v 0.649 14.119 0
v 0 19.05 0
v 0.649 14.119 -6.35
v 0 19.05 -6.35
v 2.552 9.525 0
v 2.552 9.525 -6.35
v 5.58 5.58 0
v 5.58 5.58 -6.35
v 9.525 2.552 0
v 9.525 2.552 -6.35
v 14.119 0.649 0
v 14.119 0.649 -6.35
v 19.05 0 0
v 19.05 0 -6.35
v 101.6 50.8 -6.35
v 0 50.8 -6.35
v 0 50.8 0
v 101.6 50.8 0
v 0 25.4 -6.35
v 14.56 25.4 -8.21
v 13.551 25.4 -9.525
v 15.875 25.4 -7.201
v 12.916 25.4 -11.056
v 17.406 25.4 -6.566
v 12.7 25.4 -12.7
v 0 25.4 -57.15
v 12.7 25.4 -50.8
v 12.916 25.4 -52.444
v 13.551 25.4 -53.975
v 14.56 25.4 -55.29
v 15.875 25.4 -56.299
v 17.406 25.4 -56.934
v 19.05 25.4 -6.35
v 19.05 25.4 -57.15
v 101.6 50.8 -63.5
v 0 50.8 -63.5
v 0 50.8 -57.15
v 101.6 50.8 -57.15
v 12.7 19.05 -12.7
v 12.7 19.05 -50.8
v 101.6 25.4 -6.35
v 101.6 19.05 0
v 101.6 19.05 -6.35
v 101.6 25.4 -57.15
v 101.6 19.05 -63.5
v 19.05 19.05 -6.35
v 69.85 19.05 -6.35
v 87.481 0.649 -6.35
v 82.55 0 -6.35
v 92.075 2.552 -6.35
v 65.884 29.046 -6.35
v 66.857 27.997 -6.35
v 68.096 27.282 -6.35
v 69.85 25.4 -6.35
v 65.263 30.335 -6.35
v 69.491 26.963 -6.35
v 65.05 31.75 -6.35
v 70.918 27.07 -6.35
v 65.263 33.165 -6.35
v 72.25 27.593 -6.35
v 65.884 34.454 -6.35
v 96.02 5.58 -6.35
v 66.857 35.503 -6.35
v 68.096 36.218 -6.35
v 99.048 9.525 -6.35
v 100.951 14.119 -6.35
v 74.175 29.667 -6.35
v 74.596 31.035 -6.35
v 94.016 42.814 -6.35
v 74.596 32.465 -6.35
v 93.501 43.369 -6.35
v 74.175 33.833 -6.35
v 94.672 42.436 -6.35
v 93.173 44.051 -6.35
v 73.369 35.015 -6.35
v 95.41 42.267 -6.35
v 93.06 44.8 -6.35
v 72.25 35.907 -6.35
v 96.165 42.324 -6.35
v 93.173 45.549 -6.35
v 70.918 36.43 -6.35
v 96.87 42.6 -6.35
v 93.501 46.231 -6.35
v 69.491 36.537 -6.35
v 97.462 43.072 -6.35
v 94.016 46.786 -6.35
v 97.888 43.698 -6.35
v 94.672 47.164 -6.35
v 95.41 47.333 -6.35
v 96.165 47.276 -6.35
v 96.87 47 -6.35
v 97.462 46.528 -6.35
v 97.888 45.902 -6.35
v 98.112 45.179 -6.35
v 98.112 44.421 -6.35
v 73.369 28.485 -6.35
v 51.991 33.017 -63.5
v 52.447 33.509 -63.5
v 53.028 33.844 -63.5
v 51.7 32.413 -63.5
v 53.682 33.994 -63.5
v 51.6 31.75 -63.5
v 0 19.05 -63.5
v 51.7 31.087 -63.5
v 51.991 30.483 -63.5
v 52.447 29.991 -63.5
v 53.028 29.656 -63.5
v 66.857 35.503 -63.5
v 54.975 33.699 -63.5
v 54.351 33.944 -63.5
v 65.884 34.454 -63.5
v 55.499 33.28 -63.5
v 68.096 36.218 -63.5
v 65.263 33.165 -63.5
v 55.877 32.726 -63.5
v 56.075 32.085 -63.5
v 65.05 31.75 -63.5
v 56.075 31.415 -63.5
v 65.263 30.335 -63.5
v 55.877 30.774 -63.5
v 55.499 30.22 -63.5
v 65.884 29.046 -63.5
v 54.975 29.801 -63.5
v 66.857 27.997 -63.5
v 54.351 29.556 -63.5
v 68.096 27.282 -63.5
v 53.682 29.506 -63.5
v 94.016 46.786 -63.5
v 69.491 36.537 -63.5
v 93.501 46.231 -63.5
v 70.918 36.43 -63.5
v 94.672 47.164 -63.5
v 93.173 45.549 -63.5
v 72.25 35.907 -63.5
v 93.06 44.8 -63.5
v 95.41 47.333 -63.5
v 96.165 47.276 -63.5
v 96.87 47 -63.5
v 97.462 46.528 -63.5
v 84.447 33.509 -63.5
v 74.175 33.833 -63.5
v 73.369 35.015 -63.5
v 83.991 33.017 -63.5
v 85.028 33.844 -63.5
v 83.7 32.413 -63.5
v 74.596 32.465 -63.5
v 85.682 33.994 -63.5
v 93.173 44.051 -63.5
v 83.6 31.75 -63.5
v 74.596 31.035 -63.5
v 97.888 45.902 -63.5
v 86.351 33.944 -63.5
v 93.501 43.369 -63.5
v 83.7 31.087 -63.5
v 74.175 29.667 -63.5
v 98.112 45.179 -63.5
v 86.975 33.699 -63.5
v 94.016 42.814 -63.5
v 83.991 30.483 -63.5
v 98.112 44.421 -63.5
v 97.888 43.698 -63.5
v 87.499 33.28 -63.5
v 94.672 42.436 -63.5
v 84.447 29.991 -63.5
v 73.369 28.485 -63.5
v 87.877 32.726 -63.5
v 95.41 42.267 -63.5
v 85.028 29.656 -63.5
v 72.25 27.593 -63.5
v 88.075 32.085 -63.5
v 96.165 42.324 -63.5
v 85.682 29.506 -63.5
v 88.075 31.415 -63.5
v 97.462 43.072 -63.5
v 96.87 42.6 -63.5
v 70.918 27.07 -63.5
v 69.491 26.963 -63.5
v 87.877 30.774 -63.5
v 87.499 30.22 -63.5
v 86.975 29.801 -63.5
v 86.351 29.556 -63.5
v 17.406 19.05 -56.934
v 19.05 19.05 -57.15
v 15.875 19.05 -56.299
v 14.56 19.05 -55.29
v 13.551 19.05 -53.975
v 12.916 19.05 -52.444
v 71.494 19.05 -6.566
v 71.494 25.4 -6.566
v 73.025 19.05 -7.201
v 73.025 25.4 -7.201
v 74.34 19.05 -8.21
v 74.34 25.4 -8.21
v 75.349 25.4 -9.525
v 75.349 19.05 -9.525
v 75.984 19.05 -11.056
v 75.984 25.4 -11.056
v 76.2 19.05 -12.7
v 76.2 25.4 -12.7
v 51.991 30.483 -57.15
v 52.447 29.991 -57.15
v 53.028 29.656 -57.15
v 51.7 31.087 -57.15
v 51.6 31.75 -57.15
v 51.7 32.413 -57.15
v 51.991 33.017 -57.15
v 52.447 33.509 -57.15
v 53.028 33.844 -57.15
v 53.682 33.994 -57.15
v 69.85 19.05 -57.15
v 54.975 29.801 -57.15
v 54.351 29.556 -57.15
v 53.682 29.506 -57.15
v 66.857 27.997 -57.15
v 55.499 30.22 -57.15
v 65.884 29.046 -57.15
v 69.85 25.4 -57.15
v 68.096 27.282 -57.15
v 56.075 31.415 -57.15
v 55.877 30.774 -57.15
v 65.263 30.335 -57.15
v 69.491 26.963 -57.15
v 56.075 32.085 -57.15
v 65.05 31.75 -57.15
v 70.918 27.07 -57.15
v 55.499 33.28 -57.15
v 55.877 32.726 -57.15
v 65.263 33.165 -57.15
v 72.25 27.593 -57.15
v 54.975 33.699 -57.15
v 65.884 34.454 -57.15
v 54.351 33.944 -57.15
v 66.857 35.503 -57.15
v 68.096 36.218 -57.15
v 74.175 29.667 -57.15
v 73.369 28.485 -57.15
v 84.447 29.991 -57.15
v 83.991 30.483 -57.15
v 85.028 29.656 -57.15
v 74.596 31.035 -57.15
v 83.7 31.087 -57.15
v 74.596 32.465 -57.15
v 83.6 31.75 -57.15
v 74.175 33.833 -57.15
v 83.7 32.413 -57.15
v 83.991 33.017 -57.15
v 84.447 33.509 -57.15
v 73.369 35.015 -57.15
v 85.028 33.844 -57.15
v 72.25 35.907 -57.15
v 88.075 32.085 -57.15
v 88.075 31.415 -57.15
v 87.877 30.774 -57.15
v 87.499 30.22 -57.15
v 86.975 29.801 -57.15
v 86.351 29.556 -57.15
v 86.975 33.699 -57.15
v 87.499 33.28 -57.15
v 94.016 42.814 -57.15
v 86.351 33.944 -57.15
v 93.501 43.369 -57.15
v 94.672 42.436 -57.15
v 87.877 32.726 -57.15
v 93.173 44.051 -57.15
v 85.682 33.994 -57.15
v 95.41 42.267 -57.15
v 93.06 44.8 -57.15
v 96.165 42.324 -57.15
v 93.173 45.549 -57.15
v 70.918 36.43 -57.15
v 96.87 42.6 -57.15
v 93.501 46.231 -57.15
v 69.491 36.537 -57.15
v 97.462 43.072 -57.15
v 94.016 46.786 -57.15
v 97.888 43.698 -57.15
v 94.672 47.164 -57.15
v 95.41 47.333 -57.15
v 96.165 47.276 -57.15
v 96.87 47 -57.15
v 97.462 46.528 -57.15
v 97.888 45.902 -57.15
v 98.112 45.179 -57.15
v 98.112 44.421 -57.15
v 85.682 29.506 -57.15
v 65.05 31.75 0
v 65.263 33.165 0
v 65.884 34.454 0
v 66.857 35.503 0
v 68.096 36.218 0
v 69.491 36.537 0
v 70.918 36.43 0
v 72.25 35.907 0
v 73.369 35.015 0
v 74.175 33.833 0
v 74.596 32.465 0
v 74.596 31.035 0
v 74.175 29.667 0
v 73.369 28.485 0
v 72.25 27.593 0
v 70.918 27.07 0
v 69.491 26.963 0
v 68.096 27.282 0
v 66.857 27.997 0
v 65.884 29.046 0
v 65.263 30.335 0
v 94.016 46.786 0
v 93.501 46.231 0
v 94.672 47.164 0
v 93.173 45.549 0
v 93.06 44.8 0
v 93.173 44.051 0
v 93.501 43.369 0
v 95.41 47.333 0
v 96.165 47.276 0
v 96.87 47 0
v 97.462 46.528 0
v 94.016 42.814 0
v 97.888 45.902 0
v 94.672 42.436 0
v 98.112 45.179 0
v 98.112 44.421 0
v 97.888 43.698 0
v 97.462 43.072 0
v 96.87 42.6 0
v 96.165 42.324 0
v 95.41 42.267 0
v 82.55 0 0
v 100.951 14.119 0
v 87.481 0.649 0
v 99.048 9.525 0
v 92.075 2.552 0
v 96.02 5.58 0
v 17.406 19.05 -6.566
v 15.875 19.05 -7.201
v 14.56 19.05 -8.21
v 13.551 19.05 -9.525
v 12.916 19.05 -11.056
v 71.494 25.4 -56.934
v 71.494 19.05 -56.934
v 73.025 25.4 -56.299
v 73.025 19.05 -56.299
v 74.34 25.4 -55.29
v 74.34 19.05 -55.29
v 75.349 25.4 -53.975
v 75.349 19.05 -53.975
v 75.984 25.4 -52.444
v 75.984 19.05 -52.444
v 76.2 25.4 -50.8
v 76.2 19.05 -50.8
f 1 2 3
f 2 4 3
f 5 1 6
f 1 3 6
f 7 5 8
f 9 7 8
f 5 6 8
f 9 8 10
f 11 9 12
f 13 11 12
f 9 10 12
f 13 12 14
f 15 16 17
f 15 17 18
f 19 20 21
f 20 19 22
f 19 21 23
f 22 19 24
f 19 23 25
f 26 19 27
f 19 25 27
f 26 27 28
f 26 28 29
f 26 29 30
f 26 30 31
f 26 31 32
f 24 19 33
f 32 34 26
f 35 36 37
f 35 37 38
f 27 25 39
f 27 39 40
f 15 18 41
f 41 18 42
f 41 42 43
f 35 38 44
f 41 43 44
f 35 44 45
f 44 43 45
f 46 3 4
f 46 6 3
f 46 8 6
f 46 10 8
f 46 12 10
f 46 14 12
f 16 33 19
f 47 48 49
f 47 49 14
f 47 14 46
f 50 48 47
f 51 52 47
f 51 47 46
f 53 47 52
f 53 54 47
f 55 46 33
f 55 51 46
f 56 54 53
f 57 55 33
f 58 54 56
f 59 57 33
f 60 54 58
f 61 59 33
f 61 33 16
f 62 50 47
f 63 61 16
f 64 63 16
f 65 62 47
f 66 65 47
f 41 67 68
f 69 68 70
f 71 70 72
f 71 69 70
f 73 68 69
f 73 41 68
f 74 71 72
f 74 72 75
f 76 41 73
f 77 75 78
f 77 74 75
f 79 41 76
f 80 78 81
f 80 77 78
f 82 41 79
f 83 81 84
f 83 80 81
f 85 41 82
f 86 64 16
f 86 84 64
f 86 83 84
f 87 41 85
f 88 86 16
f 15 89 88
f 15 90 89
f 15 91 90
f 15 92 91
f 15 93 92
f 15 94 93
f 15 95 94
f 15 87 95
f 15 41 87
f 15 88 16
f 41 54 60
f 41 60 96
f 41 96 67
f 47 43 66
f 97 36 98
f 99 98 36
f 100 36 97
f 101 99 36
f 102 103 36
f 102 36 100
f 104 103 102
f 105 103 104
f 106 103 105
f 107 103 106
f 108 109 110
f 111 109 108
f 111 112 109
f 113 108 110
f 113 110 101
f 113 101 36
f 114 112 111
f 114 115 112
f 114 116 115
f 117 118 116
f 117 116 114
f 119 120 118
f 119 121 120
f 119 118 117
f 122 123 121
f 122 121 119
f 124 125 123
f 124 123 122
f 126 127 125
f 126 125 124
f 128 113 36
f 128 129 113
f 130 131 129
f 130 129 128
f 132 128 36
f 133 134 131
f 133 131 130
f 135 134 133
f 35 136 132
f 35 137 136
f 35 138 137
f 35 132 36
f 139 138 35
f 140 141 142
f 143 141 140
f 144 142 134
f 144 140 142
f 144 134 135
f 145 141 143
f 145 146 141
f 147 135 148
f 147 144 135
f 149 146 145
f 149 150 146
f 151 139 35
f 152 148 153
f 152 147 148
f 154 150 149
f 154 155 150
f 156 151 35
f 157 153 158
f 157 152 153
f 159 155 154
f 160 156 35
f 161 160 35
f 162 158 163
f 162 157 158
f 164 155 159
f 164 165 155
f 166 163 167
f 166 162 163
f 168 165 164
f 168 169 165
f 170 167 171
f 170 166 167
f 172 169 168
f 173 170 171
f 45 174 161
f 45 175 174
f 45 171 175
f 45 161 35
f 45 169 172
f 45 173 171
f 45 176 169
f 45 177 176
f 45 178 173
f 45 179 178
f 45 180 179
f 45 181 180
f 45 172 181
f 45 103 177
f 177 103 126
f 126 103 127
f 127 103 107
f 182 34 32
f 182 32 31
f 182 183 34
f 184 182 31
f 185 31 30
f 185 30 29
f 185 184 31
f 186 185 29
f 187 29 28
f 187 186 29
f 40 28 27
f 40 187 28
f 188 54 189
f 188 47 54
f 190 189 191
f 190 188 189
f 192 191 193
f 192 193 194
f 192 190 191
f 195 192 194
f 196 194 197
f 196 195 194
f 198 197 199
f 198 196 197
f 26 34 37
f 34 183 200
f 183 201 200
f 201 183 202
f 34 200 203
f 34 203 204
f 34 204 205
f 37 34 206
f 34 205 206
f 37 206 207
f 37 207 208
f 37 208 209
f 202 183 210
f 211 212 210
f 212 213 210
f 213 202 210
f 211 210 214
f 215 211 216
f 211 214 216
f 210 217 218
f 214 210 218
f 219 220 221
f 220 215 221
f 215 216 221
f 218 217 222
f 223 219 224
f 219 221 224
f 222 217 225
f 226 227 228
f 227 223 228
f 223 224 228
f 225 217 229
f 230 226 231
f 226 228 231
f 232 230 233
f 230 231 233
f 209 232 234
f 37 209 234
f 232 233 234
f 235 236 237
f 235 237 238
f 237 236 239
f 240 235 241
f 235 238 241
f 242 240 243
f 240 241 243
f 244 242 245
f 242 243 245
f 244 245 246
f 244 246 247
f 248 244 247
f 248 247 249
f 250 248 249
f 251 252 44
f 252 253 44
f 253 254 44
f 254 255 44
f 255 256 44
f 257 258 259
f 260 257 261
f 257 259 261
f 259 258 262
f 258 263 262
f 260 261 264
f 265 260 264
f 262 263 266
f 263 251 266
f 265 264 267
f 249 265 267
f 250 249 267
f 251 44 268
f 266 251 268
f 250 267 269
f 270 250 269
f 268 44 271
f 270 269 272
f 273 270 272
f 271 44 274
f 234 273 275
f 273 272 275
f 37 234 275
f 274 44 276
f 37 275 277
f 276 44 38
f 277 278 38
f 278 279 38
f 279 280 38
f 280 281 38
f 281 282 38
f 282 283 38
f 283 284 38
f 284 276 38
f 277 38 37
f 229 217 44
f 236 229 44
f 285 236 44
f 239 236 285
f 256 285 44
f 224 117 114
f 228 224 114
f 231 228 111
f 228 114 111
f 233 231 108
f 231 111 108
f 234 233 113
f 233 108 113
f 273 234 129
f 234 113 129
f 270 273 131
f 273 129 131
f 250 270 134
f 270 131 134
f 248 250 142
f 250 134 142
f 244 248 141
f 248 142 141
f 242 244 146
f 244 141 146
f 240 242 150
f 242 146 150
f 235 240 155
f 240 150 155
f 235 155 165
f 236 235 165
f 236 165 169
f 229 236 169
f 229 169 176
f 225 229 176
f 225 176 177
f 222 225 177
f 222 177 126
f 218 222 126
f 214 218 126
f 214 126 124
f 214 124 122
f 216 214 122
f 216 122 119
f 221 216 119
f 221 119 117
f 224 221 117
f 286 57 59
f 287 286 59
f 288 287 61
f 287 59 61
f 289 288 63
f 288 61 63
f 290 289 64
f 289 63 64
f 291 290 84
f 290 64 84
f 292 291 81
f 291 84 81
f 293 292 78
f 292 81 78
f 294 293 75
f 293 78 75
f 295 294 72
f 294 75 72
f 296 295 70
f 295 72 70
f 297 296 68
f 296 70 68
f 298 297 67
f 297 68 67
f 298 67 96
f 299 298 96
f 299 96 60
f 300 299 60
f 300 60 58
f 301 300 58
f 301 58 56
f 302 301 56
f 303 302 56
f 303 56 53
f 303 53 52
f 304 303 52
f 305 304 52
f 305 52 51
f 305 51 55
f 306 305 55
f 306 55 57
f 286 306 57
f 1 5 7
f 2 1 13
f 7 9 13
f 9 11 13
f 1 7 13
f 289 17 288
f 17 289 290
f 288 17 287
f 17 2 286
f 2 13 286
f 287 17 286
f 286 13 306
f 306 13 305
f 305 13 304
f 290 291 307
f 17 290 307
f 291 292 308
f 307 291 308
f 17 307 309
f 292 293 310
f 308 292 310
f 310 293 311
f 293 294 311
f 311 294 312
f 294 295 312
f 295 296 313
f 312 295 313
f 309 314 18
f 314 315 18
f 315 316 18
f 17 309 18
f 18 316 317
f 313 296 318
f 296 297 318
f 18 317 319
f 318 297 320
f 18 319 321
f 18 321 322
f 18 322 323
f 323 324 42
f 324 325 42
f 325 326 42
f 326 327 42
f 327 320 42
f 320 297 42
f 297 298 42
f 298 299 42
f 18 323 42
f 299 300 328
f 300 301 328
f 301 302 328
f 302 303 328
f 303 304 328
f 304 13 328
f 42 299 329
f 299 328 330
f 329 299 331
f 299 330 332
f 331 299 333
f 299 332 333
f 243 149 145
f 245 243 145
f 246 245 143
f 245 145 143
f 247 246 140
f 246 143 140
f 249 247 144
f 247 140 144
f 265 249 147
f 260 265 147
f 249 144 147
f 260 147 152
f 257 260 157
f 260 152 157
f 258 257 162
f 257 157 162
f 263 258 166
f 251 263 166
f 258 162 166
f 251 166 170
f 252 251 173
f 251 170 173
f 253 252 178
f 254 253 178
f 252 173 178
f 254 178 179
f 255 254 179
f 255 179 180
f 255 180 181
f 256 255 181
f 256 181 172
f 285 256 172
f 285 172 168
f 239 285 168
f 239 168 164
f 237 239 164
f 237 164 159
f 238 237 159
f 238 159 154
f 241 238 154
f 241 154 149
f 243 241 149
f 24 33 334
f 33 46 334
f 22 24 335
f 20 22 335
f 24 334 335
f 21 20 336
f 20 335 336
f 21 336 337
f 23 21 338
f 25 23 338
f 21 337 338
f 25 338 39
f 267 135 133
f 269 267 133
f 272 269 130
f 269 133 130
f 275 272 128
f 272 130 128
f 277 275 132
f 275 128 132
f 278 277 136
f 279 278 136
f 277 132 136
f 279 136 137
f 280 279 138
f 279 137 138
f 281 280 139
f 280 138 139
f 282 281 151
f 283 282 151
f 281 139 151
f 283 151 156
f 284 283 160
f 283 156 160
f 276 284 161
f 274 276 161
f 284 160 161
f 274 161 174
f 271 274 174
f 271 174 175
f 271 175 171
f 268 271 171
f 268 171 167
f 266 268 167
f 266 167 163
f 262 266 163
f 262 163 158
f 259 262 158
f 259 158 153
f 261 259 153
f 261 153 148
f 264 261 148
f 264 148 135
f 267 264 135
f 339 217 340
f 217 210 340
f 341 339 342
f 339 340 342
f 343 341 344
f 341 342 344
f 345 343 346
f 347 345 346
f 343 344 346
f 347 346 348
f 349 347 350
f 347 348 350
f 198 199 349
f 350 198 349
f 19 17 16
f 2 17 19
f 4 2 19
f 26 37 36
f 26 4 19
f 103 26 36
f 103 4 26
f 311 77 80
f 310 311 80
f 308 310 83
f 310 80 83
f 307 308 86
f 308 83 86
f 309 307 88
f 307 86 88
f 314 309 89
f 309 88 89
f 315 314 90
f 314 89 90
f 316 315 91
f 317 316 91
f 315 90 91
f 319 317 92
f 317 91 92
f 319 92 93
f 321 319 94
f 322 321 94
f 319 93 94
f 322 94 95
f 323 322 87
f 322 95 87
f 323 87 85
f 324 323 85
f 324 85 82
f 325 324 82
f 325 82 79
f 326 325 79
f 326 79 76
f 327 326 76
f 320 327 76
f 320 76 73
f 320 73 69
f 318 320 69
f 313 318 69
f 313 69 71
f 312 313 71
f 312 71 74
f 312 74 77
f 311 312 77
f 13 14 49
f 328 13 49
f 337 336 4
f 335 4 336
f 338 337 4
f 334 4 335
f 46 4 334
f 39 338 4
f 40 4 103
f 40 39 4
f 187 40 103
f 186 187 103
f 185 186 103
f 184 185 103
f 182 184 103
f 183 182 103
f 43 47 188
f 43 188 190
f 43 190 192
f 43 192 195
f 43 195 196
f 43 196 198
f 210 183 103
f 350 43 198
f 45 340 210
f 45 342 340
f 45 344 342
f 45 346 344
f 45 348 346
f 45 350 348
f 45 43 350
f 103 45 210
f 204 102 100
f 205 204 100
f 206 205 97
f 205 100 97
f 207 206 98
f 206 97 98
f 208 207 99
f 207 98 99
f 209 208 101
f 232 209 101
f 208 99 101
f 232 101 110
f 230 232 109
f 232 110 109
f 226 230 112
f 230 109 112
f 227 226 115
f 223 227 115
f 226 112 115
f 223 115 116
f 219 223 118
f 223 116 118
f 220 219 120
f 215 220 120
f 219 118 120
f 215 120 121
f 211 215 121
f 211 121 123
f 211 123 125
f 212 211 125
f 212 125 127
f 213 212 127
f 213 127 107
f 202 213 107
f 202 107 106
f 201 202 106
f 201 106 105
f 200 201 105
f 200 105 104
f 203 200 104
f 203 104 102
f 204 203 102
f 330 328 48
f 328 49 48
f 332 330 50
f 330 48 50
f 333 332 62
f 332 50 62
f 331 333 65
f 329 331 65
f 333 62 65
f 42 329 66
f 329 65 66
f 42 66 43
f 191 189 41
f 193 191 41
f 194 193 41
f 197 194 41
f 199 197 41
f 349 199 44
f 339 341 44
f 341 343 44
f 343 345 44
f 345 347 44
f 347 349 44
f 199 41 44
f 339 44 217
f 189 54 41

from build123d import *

# Parameters (mm, degrees)
SKETCH1_W           = 101.6
SKETCH1_H           = 63.5
BOSS_EXTRUDE1_DEPTH = 50.8
CUT_EXTRUDE1_REACH  = 132.136
SKETCH2_W           = 50.8
SKETCH2_H           = 25.4
SKETCH2_W_2         = 57.15
SKETCH2_H_2         = 19.05
SKETCH5_W           = 63.5
SKETCH5_H           = 50.8
CUT_EXTRUDE5_DEPTH  = 6.35
CUT_EXTRUDE2_REACH  = 132.136
SKETCH3_R           = 2.25
CUT_EXTRUDE3_REACH  = 132.136
CUT_EXTRUDE4_REACH  = 132.136
SKETCH4_R           = 2.54
FILLET1_R           = 19.05
FILLET2_R           = 6.35


with BuildPart() as part:
    # Sketch1 → Boss-Extrude1 (new body)
    with BuildSketch(Plane(origin=(0, 0, 0), x_dir=(1, 0, 0), z_dir=(0, 1, 0))):
        with Locations((50.8, 31.75)):
            Rectangle(SKETCH1_W, SKETCH1_H)
    extrude(amount=BOSS_EXTRUDE1_DEPTH)

    # Sketch2 → Cut-Extrude1 (cut, up to next)
    with BuildSketch(Plane(origin=(101.6, 0, 0), x_dir=(0, 0, -1), z_dir=(1, 0, 0)), mode=Mode.PRIVATE) as cut_extrude1_sk1:
        with Locations((31.75, 38.1)):
            Rectangle(SKETCH2_W, SKETCH2_H)
    cut_extrude1_tool1 = extrude(cut_extrude1_sk1.sketch, amount=-CUT_EXTRUDE1_REACH, mode=Mode.PRIVATE) & part.part
    # Sketch2 → Cut-Extrude1 (cut, up to next)
    with BuildSketch(Plane(origin=(101.6, 0, 0), x_dir=(0, 0, -1), z_dir=(1, 0, 0)), mode=Mode.PRIVATE) as cut_extrude1_sk2:
        with Locations((34.925, 9.525)):
            Rectangle(SKETCH2_W_2, SKETCH2_H_2)
    cut_extrude1_tool2 = extrude(cut_extrude1_sk2.sketch, amount=-CUT_EXTRUDE1_REACH, mode=Mode.PRIVATE) & part.part
    add(cut_extrude1_tool1.solids().sort_by_distance((101.6, 38.1, -31.75))[0], mode=Mode.SUBTRACT)
    add(cut_extrude1_tool2.solids().sort_by_distance((101.6, 9.525, -34.925))[0], mode=Mode.SUBTRACT)

    # Sketch5 → Cut-Extrude5 (cut)
    with BuildSketch(Plane(origin=(0, 25.4, 0), x_dir=(1, 0, 0), z_dir=(0, 1, 0))):
        with Locations((44.45, 31.75)):
            Rectangle(SKETCH5_W, SKETCH5_H)
    extrude(amount=-CUT_EXTRUDE5_DEPTH, mode=Mode.SUBTRACT)

    # Sketch3 → Cut-Extrude2 (cut, up to next)
    with BuildSketch(Plane(origin=(0, 0, -63.5), x_dir=(-1, 0, 0), z_dir=(0, 0, -1)), mode=Mode.PRIVATE) as cut_extrude2_sk1:
        with Locations((-85.85, 31.75)):
            Circle(SKETCH3_R)
    cut_extrude2_tool1 = extrude(cut_extrude2_sk1.sketch, amount=-CUT_EXTRUDE2_REACH, mode=Mode.PRIVATE) & part.part
    # Sketch3 → Cut-Extrude2 (cut, up to next)
    with BuildSketch(Plane(origin=(0, 0, -63.5), x_dir=(-1, 0, 0), z_dir=(0, 0, -1)), mode=Mode.PRIVATE) as cut_extrude2_sk2:
        with Locations((-53.85, 31.75)):
            Circle(SKETCH3_R)
    cut_extrude2_tool2 = extrude(cut_extrude2_sk2.sketch, amount=-CUT_EXTRUDE2_REACH, mode=Mode.PRIVATE) & part.part
    add(cut_extrude2_tool1.solids().sort_by_distance((85.85, 31.75, -63.5))[0], mode=Mode.SUBTRACT)
    add(cut_extrude2_tool2.solids().sort_by_distance((53.85, 31.75, -63.5))[0], mode=Mode.SUBTRACT)

    # Cut-Extrude3: up to this face of the body (flat: up to its plane)
    cut_extrude3_end = Plane(part.part.faces().sort_by_distance((50.8, 25.4, 0))[0])
    # Sketch3<4> → Cut-Extrude3 (cut, up to the picked face)
    with BuildSketch(Plane(origin=(0, 0, -63.5), x_dir=(-1, 0, 0), z_dir=(0, 0, -1)), mode=Mode.PRIVATE) as cut_extrude3_sk1:
        with BuildLine():
            ThreePointArc((-65.05, 31.75), (-69.85, 36.55), (-74.65, 31.75))
            Line((-74.65, 31.75), (-65.05, 31.75))
        make_face()
    cut_extrude3_tool1 = split(extrude(cut_extrude3_sk1.sketch, amount=-CUT_EXTRUDE3_REACH, mode=Mode.PRIVATE), bisect_by=cut_extrude3_end, keep=Keep.BOTH, mode=Mode.PRIVATE)
    # Sketch3<4> → Cut-Extrude3 (cut, up to the picked face)
    with BuildSketch(Plane(origin=(0, 0, -63.5), x_dir=(-1, 0, 0), z_dir=(0, 0, -1)), mode=Mode.PRIVATE) as cut_extrude3_sk2:
        with BuildLine():
            Line((-65.05, 31.75), (-74.65, 31.75))
            ThreePointArc((-74.65, 31.75), (-69.85, 26.95), (-65.05, 31.75))
        make_face()
    cut_extrude3_tool2 = split(extrude(cut_extrude3_sk2.sketch, amount=-CUT_EXTRUDE3_REACH, mode=Mode.PRIVATE), bisect_by=cut_extrude3_end, keep=Keep.BOTH, mode=Mode.PRIVATE)
    # Sketch3<4> → Cut-Extrude3 (cut, up to the picked face)
    with BuildSketch(Plane(origin=(0, 0, -63.5), x_dir=(-1, 0, 0), z_dir=(0, 0, -1)), mode=Mode.PRIVATE) as cut_extrude3_sk3:
        with BuildLine():
            ThreePointArc((-65.05, 31.75), (-69.85, 36.55), (-74.65, 31.75))
            Line((-74.65, 31.75), (-65.05, 31.75))
        make_face()
    cut_extrude3_tool3 = split(extrude(cut_extrude3_sk3.sketch, amount=-CUT_EXTRUDE3_REACH, mode=Mode.PRIVATE), bisect_by=cut_extrude3_end, keep=Keep.BOTH, mode=Mode.PRIVATE)
    # Sketch3<4> → Cut-Extrude3 (cut, up to the picked face)
    with BuildSketch(Plane(origin=(0, 0, -63.5), x_dir=(-1, 0, 0), z_dir=(0, 0, -1)), mode=Mode.PRIVATE) as cut_extrude3_sk4:
        with BuildLine():
            Line((-65.05, 31.75), (-74.65, 31.75))
            ThreePointArc((-74.65, 31.75), (-69.85, 26.95), (-65.05, 31.75))
        make_face()
    cut_extrude3_tool4 = split(extrude(cut_extrude3_sk4.sketch, amount=-CUT_EXTRUDE3_REACH, mode=Mode.PRIVATE), bisect_by=cut_extrude3_end, keep=Keep.BOTH, mode=Mode.PRIVATE)
    add(cut_extrude3_tool1.solids().sort_by(Axis((69.85, 33.787183, -63.5), (0, 0, 1)))[0], mode=Mode.SUBTRACT)
    add(cut_extrude3_tool2.solids().sort_by(Axis((69.85, 29.712817, -63.5), (0, 0, 1)))[0], mode=Mode.SUBTRACT)
    add(cut_extrude3_tool3.solids().sort_by(Axis((69.85, 33.787183, -63.5), (0, 0, 1)))[0], mode=Mode.SUBTRACT)
    add(cut_extrude3_tool4.solids().sort_by(Axis((69.85, 29.712817, -63.5), (0, 0, 1)))[0], mode=Mode.SUBTRACT)

    # Cut-Extrude4: up to this face of the body (flat: up to its plane)
    cut_extrude4_end = Plane(part.part.faces().sort_by_distance((50.529040984, 25.309680328, 0))[0])
    # Sketch4 → Cut-Extrude4 (cut, up to the picked face)
    with BuildSketch(Plane(origin=(0, 0, -63.5), x_dir=(-1, 0, 0), z_dir=(0, 0, -1)), mode=Mode.PRIVATE) as cut_extrude4_sk1:
        with Locations((-95.6, 44.8)):
            Circle(SKETCH4_R)
    cut_extrude4_tool1 = split(extrude(cut_extrude4_sk1.sketch, amount=-CUT_EXTRUDE4_REACH, mode=Mode.PRIVATE), bisect_by=cut_extrude4_end, keep=Keep.BOTH, mode=Mode.PRIVATE)
    add(cut_extrude4_tool1.solids().sort_by(Axis((95.6, 44.8, -63.5), (0, 0, 1)))[0], mode=Mode.SUBTRACT)

    # Fillet1
    fillet1_edges = [part.edges().sort_by_distance(p)[0] for p in [
        (0, 0, -3.175),
        (101.6, 0, -3.175),
    ]]
    fillet(fillet1_edges, radius=FILLET1_R)

    # Fillet2
    fillet2_edges = [part.edges().sort_by_distance(p)[0] for p in [
        (12.7, 22.225, -6.35),
        (12.7, 22.225, -57.15),
        (76.2, 22.225, -57.15),
        (76.2, 22.225, -6.35),
    ]]
    fillet(fillet2_edges, radius=FILLET2_R)


solid = part.part
